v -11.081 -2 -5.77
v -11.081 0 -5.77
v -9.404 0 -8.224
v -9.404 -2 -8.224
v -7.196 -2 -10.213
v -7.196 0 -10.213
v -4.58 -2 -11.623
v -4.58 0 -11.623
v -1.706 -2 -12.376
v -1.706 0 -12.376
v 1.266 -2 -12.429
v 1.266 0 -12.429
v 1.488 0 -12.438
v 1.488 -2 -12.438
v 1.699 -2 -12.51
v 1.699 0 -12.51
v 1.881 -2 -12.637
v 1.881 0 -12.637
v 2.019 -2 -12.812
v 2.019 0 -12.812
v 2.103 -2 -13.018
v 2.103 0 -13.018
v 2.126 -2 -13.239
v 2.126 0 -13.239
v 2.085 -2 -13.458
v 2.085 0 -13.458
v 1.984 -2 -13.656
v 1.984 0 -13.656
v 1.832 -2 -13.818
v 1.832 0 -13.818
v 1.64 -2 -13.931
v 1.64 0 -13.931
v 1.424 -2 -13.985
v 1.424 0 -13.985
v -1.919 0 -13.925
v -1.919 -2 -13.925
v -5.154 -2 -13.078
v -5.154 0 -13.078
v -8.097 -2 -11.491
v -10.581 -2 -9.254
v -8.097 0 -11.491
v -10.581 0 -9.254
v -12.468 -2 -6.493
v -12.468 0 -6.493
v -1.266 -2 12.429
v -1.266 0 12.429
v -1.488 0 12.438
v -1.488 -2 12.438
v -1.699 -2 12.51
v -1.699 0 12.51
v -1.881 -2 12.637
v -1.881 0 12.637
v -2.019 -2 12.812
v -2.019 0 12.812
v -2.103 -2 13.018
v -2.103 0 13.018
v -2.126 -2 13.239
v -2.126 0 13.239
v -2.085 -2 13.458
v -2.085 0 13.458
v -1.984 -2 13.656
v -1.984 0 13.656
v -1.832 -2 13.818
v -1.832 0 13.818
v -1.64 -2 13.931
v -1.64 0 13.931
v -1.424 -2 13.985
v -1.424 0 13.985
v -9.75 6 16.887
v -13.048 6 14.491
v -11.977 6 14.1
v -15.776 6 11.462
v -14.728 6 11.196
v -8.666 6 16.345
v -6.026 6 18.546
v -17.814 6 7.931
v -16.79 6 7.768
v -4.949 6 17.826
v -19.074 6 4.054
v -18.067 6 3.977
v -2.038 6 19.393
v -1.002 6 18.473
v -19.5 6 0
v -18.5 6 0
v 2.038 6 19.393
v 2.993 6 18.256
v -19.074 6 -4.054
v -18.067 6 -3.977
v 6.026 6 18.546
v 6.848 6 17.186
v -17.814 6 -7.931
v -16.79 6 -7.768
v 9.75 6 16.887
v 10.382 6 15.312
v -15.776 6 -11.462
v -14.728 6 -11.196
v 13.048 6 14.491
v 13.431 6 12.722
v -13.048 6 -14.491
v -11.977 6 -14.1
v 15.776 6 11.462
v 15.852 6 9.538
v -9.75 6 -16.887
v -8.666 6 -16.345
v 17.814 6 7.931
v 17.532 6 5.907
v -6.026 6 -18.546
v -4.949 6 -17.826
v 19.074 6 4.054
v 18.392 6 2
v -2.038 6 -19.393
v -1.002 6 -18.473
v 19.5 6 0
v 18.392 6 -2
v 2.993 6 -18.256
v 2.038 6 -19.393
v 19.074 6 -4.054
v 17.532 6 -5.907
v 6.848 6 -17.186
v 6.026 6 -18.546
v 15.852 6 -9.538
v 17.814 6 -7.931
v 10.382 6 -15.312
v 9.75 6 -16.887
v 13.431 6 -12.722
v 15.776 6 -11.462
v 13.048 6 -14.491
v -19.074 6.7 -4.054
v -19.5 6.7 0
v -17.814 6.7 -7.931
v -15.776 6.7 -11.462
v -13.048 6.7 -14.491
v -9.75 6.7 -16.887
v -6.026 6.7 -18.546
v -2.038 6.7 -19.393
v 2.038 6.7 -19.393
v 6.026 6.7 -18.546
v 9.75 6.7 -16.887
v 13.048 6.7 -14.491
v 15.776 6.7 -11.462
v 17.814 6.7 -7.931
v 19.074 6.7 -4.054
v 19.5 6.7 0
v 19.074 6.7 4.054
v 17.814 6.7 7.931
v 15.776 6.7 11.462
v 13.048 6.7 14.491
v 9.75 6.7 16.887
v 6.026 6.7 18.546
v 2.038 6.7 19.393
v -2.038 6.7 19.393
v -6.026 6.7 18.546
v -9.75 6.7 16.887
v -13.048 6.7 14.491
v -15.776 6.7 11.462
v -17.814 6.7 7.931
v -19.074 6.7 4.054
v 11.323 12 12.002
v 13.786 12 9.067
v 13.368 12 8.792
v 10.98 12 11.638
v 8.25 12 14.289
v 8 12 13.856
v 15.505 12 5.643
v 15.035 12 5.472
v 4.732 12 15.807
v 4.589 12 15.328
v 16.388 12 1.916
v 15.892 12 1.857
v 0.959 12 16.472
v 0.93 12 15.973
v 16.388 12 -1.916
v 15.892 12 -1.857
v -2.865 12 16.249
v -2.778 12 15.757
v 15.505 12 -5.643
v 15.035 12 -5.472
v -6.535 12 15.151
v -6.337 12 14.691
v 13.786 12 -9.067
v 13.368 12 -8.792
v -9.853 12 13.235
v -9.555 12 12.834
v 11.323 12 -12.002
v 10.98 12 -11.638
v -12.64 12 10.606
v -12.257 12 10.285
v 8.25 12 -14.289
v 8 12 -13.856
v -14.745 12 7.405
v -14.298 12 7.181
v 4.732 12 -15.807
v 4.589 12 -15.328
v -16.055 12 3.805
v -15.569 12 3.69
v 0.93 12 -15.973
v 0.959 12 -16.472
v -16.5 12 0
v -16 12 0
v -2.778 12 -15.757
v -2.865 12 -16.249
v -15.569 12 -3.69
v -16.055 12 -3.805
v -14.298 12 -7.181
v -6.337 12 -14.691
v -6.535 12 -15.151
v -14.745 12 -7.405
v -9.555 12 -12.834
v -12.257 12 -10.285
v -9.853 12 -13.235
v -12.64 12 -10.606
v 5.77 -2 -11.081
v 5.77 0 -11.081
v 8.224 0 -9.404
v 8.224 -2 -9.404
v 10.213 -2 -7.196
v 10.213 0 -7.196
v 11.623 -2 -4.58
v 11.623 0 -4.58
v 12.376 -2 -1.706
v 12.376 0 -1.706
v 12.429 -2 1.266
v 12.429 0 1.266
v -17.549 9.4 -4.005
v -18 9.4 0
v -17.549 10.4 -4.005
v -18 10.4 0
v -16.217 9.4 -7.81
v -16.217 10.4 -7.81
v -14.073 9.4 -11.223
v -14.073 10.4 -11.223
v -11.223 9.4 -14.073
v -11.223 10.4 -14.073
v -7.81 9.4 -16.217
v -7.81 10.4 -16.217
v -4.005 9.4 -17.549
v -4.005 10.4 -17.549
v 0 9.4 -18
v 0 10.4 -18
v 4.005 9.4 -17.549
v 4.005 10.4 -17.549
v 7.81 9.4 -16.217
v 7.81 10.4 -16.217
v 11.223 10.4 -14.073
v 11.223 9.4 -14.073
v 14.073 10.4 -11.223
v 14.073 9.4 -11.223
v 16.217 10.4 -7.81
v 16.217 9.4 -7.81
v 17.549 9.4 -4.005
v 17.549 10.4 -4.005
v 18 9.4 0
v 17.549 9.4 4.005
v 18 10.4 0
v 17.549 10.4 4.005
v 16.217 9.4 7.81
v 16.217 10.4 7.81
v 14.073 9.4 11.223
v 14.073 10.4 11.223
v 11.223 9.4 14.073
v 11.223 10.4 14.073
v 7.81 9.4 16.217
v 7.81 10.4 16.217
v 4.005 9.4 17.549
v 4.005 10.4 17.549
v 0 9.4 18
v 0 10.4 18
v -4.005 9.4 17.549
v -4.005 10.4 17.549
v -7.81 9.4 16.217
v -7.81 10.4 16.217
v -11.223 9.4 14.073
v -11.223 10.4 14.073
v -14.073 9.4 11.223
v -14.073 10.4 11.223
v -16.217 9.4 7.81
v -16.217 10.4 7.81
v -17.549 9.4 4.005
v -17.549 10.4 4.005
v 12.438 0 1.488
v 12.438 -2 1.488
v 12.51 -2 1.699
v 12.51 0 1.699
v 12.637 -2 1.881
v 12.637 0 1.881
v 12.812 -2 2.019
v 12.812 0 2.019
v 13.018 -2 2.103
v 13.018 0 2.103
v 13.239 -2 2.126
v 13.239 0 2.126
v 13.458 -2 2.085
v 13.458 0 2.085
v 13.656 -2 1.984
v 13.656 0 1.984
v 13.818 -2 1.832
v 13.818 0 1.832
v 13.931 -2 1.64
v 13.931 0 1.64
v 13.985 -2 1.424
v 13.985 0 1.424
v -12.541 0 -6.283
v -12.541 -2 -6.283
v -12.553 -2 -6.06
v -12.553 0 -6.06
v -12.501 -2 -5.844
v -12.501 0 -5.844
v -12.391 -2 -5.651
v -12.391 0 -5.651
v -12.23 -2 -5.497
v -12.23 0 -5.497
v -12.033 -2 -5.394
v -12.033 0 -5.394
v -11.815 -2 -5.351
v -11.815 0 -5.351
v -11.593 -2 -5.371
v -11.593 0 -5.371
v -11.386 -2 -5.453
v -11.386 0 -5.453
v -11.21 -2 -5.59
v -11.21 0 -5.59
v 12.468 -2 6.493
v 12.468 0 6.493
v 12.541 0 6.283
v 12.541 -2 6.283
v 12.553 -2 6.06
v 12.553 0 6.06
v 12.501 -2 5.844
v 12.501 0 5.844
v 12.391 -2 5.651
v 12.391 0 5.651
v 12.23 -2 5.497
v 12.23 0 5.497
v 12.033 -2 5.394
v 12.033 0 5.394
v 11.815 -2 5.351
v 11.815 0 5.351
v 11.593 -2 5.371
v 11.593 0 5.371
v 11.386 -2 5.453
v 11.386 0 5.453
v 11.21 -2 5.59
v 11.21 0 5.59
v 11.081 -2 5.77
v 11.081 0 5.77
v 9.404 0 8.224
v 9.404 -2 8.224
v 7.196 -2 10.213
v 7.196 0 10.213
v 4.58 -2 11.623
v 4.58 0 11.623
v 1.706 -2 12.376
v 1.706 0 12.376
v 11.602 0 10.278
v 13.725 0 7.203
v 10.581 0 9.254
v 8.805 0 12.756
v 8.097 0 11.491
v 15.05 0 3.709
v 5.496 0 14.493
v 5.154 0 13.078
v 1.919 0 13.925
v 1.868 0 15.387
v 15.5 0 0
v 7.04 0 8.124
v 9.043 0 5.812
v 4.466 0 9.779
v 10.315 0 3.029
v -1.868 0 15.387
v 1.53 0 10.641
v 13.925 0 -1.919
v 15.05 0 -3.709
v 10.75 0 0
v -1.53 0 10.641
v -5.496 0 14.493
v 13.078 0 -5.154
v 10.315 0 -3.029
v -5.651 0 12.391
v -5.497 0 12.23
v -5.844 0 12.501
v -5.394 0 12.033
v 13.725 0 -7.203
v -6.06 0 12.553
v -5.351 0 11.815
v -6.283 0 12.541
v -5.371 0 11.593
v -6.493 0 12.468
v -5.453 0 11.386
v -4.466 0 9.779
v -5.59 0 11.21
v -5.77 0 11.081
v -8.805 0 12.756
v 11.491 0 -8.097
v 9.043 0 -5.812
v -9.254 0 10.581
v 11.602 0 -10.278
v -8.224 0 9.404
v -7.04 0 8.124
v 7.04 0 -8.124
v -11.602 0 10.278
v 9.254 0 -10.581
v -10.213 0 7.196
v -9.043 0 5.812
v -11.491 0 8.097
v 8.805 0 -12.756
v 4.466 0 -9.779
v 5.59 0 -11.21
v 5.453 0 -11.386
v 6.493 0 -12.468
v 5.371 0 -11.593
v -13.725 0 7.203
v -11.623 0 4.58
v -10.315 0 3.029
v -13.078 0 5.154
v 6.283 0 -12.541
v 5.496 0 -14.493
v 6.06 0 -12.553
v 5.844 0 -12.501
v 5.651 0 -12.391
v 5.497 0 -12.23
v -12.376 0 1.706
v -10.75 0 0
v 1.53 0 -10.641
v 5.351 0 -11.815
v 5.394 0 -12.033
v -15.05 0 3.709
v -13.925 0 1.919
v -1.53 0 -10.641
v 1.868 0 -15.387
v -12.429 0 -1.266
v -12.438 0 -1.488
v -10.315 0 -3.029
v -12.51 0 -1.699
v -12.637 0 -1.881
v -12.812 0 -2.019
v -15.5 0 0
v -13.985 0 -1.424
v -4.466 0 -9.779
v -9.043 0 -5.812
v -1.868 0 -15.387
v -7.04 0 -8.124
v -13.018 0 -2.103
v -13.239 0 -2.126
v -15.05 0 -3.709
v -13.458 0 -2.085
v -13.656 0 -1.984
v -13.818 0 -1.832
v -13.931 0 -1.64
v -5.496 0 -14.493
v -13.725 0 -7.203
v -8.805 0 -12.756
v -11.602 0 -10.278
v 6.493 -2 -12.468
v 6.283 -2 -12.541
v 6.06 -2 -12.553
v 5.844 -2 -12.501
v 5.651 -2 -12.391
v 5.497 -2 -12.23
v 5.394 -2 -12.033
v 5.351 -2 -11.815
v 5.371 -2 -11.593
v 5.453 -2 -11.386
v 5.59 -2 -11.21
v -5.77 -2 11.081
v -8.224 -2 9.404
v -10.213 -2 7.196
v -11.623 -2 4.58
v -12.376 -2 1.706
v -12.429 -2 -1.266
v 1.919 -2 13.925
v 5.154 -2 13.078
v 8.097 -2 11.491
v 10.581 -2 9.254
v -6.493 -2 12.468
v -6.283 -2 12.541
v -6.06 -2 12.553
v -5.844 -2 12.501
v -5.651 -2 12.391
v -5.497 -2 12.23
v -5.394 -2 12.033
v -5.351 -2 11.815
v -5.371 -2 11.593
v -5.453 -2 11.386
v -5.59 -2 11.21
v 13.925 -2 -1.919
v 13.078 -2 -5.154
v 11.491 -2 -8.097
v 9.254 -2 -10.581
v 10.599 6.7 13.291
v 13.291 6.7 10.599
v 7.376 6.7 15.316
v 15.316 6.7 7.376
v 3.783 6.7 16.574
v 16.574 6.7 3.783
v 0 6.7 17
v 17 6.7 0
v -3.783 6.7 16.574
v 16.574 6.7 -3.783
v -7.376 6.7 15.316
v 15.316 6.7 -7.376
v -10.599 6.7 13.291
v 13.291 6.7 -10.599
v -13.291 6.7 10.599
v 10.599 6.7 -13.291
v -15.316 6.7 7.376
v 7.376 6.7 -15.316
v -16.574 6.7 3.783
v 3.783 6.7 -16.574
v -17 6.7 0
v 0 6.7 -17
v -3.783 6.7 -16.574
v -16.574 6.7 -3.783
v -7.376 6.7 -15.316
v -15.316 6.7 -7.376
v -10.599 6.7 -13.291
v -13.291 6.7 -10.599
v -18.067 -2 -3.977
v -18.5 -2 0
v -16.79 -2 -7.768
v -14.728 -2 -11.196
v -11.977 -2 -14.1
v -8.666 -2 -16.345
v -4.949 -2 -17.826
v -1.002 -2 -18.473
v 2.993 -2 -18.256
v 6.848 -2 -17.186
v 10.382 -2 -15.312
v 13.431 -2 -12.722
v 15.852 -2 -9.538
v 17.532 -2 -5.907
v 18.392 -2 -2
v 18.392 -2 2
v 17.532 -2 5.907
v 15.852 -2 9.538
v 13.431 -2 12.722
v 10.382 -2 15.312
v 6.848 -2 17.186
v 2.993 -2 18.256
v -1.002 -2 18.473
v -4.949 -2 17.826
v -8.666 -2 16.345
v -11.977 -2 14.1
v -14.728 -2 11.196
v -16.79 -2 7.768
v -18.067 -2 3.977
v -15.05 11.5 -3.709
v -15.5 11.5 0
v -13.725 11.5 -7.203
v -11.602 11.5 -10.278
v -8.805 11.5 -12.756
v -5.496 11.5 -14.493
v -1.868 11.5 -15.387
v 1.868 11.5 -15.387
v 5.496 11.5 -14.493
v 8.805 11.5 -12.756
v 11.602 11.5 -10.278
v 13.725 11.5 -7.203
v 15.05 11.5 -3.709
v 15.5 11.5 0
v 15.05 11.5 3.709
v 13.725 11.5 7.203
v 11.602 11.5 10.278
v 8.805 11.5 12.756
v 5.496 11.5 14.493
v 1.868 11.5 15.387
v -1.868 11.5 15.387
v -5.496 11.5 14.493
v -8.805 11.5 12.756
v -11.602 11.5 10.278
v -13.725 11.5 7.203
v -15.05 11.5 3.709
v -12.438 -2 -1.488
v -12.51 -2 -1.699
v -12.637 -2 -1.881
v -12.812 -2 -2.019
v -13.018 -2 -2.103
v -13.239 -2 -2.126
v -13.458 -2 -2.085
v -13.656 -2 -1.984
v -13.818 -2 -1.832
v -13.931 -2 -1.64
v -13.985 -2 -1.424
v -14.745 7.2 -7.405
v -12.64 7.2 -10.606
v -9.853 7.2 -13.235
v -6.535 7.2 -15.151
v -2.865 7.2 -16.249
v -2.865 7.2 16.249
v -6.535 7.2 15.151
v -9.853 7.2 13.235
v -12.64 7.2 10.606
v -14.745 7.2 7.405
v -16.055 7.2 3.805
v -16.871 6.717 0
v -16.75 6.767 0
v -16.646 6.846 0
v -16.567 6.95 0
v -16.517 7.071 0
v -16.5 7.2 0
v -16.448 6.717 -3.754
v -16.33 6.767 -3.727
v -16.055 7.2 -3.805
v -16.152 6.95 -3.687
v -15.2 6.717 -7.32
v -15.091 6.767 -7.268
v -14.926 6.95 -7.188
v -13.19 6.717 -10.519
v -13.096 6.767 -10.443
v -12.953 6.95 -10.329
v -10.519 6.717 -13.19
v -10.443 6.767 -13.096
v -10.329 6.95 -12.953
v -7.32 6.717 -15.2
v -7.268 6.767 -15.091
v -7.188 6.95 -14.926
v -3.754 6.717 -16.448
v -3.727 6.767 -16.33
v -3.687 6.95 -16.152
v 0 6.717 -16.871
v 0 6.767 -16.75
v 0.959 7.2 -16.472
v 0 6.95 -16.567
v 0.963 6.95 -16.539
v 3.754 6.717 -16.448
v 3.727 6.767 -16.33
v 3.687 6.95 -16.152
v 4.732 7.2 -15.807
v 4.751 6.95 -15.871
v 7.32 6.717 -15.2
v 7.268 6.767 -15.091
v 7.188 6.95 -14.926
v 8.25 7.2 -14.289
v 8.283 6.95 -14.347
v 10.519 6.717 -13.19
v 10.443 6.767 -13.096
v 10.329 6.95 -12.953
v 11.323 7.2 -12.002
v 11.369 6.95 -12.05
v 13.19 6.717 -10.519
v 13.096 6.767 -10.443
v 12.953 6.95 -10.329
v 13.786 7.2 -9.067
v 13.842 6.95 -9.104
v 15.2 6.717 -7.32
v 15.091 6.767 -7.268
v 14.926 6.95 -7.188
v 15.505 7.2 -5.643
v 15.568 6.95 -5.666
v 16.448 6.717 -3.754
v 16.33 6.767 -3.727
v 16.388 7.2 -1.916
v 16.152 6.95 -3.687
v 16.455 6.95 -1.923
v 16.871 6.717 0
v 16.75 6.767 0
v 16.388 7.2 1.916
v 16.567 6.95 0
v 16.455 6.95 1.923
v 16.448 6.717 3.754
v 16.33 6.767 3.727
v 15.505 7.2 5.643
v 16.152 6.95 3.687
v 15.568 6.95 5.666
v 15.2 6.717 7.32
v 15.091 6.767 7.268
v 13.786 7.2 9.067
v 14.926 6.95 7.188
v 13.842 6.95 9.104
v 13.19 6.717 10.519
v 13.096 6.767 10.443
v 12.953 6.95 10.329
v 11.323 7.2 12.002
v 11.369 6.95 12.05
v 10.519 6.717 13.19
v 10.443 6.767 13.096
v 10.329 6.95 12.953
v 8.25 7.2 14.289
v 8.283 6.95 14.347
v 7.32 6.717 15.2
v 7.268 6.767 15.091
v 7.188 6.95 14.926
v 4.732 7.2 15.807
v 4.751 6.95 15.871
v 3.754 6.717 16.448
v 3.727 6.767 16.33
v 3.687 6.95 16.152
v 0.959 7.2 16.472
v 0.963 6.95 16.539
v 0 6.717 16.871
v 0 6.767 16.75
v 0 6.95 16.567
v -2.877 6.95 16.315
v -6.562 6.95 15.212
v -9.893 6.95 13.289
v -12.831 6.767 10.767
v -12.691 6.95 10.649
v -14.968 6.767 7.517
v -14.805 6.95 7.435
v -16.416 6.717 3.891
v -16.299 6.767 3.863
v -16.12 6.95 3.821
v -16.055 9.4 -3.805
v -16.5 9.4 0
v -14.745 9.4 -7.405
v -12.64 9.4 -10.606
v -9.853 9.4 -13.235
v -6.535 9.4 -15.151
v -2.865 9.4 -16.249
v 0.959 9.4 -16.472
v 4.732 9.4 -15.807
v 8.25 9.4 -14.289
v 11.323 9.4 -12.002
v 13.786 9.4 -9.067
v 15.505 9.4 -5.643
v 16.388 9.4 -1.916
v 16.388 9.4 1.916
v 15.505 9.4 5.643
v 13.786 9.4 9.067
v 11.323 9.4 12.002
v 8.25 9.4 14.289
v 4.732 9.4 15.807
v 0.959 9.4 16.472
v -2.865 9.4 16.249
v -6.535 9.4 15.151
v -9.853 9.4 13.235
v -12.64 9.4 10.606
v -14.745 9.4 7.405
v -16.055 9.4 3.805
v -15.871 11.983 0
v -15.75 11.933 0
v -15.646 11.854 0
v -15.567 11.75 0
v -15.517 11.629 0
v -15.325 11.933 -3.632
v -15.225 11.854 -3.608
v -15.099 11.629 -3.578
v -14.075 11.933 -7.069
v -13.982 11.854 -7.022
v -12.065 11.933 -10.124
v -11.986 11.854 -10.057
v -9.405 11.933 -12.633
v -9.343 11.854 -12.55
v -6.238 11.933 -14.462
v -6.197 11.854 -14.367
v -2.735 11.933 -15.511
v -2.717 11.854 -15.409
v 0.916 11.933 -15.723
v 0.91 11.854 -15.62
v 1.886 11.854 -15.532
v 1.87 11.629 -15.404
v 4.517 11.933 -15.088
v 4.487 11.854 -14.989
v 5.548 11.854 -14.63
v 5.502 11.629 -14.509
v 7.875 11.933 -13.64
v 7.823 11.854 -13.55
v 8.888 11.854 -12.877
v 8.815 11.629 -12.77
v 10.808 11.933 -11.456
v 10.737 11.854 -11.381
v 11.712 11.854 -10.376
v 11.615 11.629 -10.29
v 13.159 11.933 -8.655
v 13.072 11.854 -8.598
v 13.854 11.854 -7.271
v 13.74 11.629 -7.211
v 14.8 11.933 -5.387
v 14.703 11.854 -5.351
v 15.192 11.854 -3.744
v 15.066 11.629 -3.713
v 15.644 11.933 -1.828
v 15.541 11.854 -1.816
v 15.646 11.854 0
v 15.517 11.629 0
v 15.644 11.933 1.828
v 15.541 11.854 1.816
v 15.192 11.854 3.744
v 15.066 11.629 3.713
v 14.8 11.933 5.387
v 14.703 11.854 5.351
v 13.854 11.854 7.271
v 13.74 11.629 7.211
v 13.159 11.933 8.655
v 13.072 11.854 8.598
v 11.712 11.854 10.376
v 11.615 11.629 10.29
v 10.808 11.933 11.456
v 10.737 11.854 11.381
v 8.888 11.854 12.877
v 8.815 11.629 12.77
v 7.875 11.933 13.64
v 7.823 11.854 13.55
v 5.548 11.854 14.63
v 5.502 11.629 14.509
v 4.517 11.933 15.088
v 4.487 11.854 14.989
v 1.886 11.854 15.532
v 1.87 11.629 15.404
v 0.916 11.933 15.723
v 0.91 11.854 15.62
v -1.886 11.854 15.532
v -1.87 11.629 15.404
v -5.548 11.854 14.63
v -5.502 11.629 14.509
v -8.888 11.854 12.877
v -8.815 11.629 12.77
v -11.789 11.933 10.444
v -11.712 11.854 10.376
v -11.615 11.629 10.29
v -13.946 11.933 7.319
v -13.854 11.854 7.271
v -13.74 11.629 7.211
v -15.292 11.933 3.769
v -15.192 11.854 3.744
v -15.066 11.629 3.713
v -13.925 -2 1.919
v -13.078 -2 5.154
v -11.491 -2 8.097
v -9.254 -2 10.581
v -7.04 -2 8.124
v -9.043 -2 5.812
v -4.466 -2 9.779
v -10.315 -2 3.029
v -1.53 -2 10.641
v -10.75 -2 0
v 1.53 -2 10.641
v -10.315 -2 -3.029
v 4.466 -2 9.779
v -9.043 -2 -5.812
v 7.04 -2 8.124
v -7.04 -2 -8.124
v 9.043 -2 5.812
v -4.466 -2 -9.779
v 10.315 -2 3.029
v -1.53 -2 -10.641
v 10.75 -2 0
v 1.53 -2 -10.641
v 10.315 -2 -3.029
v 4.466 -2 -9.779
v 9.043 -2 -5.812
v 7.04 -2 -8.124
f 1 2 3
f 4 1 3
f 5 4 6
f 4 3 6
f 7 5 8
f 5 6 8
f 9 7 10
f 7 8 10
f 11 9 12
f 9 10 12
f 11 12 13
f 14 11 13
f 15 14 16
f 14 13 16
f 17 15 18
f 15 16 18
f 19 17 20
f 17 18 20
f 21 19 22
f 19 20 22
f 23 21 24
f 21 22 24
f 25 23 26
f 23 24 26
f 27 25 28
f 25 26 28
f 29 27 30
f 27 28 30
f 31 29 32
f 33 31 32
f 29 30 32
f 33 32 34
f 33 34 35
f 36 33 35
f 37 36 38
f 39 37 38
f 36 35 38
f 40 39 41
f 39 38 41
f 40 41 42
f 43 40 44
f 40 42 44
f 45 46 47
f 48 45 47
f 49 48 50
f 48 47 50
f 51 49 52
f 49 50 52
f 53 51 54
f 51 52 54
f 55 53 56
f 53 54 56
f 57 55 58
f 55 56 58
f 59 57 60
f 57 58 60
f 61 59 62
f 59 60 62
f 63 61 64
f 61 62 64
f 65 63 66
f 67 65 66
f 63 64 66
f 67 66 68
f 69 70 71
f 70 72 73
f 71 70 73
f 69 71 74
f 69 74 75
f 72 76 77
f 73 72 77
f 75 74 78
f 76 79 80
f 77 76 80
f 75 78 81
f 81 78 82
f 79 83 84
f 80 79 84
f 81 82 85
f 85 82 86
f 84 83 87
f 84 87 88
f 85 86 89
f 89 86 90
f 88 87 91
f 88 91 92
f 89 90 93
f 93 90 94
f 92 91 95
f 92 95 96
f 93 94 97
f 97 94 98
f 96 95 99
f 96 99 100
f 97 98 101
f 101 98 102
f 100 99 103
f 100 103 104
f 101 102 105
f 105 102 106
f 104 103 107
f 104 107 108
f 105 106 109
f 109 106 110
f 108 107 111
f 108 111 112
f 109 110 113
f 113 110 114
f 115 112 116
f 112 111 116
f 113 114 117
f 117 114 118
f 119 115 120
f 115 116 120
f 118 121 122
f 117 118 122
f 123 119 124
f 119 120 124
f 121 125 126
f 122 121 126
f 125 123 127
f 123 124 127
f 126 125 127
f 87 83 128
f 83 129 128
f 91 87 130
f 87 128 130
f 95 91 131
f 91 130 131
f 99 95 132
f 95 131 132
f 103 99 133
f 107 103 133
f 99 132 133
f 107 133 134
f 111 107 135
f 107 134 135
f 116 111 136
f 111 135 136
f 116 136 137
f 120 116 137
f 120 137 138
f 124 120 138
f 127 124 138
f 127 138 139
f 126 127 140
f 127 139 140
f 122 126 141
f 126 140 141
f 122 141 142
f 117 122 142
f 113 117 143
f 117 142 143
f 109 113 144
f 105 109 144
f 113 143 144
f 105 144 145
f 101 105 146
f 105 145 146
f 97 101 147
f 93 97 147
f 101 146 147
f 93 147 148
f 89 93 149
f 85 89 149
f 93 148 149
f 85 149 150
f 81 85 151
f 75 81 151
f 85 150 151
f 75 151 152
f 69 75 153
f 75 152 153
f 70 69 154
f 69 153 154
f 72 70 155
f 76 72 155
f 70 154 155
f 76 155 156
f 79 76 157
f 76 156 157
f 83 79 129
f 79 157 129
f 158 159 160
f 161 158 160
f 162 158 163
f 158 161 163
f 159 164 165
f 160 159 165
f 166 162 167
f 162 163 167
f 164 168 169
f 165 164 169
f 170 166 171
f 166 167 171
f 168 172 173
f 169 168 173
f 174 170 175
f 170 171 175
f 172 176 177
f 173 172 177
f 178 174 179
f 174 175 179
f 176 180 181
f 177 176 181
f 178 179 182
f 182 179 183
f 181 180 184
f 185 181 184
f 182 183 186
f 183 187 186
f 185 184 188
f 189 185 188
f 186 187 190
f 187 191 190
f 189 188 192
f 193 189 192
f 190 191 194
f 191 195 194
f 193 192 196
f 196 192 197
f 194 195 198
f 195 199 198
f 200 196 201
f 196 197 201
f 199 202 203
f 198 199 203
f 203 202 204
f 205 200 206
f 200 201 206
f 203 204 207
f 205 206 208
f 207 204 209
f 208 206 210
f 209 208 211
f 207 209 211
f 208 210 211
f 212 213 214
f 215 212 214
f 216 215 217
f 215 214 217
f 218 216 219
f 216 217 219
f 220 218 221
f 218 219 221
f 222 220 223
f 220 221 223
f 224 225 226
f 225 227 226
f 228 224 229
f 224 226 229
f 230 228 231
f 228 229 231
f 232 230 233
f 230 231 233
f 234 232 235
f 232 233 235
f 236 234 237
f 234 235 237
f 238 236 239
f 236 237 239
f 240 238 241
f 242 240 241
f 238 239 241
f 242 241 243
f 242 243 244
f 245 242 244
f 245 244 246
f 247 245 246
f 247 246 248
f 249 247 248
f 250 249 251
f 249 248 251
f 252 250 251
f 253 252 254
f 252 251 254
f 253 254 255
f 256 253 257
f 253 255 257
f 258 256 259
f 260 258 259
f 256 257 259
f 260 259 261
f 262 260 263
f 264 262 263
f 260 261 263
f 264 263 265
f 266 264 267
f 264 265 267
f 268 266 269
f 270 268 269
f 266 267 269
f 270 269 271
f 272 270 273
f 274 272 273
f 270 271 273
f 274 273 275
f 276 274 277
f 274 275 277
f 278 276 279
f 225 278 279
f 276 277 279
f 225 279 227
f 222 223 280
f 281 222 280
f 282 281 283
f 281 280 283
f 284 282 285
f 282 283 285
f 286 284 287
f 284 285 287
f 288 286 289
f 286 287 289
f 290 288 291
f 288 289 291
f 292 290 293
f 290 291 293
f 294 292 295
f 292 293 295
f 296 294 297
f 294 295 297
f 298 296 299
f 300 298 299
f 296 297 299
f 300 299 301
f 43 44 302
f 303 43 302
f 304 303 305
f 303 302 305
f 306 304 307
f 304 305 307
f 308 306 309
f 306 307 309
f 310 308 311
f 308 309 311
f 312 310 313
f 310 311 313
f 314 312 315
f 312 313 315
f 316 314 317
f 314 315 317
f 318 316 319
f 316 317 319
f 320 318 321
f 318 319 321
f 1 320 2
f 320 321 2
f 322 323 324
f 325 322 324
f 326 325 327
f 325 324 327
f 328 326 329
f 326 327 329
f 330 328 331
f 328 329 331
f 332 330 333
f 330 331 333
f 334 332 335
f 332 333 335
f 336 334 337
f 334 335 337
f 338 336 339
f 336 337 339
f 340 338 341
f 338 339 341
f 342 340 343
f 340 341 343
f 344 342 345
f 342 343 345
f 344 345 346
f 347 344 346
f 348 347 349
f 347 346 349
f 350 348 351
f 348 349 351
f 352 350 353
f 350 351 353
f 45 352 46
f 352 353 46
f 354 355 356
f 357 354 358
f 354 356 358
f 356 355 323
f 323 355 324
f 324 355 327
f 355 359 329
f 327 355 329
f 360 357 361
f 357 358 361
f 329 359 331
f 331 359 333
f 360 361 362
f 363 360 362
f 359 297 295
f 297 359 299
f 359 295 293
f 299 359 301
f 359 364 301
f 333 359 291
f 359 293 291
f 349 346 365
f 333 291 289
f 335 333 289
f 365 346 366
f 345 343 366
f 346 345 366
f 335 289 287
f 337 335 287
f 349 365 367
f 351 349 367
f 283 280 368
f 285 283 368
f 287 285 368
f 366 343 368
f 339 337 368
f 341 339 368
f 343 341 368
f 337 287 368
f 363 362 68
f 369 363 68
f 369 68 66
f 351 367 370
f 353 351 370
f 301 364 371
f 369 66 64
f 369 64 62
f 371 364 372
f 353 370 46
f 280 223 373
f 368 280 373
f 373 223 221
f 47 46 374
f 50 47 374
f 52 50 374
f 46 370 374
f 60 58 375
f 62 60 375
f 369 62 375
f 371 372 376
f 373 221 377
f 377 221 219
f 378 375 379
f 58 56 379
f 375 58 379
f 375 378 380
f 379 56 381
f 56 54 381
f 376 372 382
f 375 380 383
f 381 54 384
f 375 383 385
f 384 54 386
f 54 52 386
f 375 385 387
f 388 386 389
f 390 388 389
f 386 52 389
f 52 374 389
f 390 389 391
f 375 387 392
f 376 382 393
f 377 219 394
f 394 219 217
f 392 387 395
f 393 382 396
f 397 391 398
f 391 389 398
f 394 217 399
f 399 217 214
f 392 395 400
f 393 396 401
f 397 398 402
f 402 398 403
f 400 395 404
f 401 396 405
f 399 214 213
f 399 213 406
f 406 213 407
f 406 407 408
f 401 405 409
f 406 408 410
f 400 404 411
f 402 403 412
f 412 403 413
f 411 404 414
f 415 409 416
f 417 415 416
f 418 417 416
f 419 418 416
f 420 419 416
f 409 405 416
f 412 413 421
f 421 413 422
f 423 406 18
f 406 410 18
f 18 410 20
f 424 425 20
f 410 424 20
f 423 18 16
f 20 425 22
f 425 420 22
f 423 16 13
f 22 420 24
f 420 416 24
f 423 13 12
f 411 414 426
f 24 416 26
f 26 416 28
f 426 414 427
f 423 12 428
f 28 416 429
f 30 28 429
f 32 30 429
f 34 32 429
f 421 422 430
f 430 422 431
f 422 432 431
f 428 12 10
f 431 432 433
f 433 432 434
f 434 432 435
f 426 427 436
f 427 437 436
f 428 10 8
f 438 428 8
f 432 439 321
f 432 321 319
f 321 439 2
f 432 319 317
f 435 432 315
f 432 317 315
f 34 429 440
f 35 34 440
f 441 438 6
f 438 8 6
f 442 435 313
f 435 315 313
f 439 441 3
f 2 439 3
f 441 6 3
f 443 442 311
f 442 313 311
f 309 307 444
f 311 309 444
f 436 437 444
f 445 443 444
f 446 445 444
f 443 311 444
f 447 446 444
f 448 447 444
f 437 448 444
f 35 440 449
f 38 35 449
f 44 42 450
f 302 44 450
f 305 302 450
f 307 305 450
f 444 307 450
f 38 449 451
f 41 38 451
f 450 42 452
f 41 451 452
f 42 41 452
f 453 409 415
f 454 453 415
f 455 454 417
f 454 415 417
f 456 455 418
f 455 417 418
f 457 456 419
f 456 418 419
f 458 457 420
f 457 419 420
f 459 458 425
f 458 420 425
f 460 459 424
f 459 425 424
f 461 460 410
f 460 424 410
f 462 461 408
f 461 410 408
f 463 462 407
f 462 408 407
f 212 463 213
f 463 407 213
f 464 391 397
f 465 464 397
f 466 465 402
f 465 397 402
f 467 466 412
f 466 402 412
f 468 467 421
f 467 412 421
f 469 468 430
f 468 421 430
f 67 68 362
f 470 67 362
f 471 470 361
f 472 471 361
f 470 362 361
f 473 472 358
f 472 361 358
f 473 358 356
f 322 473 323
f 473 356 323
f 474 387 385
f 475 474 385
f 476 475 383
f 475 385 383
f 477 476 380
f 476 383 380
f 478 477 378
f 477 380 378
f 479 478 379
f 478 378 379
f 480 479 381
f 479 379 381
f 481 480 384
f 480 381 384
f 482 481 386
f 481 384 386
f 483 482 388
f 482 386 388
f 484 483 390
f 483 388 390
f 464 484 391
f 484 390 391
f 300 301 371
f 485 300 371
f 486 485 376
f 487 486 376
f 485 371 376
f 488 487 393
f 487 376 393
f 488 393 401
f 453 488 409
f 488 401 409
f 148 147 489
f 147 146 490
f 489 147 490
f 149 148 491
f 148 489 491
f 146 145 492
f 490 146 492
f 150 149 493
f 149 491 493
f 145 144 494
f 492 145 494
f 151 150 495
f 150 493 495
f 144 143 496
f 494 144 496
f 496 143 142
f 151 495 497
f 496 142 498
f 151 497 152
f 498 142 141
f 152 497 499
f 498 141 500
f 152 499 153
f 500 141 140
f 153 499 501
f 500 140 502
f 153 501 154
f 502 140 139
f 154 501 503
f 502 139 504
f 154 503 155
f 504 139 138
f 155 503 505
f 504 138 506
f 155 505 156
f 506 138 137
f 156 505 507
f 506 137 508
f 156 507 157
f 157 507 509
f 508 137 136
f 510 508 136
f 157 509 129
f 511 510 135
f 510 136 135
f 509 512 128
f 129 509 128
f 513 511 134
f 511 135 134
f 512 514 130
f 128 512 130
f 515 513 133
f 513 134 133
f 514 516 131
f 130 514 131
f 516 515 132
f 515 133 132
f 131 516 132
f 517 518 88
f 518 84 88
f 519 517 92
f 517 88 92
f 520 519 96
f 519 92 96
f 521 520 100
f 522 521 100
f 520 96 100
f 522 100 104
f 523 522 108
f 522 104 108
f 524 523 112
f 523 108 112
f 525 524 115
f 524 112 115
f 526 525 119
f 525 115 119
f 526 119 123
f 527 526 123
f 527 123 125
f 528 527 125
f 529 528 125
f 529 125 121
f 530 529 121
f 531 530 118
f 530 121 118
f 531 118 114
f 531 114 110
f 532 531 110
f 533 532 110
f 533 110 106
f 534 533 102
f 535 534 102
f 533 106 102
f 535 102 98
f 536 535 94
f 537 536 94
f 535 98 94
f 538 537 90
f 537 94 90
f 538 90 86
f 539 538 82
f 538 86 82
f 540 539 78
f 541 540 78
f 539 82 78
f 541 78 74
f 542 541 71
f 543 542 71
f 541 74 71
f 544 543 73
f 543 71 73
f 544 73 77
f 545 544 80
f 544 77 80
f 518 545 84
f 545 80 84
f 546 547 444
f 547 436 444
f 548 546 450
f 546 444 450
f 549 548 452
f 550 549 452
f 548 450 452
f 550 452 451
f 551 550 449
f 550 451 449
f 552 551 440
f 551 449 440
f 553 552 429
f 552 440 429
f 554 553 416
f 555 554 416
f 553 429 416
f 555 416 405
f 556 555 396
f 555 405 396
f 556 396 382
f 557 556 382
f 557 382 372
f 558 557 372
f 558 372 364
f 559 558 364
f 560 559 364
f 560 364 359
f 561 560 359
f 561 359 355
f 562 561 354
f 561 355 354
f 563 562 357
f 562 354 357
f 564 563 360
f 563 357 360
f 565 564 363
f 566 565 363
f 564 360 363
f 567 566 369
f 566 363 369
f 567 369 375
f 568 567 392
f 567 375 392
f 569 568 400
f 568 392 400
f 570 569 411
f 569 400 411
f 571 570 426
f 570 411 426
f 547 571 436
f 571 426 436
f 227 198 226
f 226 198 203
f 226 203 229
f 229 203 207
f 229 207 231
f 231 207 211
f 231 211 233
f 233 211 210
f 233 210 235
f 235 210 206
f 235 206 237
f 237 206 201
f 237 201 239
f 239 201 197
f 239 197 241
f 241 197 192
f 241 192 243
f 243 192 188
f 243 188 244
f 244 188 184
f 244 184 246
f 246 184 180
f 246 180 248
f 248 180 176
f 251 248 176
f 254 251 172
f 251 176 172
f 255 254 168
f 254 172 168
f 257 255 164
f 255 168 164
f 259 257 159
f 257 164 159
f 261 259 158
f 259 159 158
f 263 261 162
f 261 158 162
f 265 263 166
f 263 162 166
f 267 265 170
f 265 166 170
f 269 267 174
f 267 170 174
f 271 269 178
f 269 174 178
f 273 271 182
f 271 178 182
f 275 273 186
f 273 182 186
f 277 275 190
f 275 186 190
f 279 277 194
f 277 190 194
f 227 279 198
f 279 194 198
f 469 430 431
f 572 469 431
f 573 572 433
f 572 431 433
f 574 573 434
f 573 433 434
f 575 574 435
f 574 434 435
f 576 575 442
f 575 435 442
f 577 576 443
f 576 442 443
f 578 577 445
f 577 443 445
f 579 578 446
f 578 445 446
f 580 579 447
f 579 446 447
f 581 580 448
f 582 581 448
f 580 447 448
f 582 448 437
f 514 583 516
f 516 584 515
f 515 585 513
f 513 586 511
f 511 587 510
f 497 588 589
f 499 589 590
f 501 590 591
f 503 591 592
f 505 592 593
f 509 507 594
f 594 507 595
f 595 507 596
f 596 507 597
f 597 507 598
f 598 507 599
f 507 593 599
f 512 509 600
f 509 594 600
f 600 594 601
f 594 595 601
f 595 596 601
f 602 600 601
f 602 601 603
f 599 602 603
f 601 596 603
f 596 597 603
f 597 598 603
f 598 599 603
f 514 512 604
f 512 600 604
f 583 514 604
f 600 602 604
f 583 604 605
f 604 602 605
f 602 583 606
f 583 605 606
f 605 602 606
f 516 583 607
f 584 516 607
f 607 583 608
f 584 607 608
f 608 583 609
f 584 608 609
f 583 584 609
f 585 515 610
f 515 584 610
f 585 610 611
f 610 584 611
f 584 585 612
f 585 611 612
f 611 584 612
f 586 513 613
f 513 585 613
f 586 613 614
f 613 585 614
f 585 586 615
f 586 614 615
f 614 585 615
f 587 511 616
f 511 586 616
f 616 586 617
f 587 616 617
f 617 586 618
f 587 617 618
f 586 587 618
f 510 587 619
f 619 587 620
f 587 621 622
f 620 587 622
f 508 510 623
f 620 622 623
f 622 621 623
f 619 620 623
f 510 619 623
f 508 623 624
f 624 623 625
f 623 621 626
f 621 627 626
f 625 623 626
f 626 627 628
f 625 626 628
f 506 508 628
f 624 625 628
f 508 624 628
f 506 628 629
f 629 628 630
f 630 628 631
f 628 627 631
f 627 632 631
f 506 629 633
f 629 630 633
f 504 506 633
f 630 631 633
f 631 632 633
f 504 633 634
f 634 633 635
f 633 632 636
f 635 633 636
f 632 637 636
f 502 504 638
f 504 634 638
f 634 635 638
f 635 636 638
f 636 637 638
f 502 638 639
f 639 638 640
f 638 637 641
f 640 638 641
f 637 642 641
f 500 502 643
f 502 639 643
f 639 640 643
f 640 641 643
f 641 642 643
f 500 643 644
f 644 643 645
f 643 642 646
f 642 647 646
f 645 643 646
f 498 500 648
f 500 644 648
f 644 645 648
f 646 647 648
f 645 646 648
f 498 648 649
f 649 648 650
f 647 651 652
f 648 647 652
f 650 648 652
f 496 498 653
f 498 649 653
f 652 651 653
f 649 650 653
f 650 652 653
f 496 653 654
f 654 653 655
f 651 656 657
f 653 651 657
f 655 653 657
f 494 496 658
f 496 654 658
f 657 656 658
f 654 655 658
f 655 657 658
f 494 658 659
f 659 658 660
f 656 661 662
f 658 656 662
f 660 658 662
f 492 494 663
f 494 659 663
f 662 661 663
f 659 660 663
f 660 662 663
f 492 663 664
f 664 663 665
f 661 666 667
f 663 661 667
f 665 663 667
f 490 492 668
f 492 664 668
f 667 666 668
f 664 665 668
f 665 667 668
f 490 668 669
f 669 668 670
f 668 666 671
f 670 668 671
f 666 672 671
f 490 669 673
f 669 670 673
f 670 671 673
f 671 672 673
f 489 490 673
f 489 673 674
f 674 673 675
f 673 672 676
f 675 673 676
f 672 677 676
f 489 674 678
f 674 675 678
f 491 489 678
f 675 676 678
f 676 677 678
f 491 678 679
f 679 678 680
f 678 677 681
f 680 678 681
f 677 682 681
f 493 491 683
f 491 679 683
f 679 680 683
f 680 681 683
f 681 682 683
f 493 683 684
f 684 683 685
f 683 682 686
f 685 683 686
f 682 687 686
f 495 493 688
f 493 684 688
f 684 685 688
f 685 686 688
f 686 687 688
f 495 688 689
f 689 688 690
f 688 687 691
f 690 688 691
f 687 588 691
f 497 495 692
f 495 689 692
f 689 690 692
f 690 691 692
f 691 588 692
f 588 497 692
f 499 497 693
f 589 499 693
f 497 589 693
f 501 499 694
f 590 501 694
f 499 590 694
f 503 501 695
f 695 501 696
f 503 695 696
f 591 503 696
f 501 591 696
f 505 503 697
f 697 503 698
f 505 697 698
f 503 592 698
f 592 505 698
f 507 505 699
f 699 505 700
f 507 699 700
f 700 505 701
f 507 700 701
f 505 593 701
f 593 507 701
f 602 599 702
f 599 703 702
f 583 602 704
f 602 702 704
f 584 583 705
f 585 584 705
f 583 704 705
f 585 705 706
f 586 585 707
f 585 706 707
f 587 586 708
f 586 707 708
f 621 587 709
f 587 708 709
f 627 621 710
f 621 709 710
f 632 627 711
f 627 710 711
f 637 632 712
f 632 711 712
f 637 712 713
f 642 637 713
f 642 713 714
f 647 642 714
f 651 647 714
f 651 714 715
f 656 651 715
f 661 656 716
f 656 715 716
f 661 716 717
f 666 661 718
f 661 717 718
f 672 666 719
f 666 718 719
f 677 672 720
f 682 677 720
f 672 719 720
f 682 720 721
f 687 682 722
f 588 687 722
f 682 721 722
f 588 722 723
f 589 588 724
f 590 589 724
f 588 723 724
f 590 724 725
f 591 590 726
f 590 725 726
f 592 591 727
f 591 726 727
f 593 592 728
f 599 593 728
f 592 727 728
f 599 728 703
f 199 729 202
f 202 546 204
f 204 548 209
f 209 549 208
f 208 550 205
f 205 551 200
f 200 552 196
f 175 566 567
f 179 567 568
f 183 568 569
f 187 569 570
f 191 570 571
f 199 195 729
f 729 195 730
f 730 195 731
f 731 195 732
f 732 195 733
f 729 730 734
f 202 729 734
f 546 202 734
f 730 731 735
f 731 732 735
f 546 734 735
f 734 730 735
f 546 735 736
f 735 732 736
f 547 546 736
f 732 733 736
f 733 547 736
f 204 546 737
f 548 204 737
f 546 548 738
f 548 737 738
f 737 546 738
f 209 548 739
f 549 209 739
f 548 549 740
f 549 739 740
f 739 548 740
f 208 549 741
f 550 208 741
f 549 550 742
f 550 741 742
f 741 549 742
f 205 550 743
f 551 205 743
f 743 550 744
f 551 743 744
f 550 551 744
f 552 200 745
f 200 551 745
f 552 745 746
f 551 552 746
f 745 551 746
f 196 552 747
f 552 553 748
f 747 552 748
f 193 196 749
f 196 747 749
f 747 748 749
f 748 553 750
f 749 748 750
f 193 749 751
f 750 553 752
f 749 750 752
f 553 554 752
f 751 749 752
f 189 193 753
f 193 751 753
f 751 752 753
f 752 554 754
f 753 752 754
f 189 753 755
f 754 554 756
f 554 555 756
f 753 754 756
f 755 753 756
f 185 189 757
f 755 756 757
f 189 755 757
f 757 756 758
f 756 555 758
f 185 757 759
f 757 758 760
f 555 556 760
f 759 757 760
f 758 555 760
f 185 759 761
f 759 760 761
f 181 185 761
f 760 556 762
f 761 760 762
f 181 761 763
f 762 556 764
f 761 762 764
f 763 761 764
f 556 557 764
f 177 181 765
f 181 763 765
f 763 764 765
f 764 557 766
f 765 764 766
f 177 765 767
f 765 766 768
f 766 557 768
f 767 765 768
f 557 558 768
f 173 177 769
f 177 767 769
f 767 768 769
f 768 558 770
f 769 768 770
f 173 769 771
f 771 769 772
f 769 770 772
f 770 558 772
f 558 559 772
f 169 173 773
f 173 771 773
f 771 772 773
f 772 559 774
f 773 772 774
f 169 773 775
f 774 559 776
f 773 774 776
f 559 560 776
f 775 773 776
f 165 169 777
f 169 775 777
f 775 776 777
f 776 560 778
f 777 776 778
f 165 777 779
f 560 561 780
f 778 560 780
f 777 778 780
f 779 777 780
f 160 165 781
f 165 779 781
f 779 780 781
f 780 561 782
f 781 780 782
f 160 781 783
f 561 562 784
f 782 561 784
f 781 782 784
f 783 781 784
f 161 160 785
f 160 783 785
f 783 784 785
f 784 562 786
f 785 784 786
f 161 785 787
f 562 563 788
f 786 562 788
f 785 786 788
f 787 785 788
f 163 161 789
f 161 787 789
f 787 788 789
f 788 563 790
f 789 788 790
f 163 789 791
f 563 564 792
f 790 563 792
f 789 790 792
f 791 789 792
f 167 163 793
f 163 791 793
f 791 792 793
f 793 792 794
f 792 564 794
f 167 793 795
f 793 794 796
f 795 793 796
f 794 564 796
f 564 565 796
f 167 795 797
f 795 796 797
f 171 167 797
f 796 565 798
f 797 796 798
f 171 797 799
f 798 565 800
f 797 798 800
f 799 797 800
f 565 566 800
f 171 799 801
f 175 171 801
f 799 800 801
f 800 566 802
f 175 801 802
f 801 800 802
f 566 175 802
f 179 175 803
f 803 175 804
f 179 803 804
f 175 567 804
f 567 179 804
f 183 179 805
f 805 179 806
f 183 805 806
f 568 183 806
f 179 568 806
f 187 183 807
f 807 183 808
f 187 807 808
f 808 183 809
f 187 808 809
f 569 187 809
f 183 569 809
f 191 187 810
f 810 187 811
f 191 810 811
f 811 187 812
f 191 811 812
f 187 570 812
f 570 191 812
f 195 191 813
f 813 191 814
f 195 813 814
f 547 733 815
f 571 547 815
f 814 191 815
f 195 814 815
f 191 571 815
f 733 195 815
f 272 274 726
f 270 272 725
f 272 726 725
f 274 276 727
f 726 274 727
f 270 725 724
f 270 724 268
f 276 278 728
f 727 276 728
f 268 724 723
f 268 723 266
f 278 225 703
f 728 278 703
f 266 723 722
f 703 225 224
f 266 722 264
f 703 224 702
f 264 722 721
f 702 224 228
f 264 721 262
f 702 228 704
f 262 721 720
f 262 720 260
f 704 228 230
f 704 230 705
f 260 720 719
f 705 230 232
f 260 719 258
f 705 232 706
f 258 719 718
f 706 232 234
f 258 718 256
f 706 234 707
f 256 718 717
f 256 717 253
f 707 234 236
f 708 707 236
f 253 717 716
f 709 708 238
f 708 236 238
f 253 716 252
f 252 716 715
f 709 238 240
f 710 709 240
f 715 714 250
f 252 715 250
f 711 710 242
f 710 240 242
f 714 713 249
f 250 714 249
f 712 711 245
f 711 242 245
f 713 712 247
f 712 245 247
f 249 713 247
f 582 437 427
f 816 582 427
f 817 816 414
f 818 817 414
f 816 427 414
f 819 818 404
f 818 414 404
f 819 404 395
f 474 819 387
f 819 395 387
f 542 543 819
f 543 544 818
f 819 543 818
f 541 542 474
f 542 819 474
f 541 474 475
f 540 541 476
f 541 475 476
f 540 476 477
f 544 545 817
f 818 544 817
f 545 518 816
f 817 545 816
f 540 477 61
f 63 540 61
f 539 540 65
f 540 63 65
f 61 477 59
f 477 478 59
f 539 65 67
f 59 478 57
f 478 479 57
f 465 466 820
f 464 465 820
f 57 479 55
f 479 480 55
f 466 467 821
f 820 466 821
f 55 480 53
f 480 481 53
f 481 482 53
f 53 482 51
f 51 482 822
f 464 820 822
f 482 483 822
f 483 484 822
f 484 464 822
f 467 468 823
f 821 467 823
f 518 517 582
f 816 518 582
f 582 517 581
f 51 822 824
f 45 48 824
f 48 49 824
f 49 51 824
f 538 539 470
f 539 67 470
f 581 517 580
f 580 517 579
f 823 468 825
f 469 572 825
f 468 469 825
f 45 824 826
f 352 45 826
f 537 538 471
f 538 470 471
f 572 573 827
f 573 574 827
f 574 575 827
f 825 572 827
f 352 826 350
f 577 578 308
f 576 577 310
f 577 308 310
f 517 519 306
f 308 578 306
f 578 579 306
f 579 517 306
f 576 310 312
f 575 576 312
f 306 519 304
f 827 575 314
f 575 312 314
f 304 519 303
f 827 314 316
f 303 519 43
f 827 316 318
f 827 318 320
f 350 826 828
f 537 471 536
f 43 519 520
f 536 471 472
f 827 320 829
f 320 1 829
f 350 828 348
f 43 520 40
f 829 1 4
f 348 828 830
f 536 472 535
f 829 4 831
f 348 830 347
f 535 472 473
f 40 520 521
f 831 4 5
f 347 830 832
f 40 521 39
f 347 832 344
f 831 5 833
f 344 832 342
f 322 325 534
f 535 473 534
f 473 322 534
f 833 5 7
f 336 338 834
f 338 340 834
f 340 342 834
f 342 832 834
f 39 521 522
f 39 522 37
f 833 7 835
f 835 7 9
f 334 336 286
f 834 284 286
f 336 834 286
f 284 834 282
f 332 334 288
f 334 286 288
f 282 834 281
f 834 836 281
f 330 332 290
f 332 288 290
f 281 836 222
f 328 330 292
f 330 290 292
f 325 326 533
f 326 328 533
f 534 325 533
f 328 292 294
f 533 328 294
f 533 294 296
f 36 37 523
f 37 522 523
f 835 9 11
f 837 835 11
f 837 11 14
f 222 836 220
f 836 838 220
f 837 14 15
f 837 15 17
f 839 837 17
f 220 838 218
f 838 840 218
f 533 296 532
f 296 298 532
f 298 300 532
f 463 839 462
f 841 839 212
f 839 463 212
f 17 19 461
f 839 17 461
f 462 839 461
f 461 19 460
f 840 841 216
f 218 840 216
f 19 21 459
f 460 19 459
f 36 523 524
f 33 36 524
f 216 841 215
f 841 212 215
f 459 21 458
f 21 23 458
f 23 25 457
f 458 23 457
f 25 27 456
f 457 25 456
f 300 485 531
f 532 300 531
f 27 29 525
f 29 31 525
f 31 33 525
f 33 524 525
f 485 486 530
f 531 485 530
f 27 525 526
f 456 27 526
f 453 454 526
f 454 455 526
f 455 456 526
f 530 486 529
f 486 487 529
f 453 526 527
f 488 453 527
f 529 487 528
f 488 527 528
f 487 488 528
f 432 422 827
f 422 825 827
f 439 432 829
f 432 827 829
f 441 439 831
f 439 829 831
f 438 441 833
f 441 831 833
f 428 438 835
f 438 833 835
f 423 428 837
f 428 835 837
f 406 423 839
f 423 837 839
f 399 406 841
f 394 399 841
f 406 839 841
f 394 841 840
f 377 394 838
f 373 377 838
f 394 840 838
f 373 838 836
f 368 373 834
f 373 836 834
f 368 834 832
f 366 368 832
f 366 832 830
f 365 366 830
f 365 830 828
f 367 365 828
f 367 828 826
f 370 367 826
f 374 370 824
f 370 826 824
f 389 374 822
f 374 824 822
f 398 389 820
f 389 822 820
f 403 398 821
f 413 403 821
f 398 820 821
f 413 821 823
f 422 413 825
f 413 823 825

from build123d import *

# Parameters (mm, degrees)
CUT_EXTRUDE1_REACH = 4


with BuildPart() as part:
    # Sketch1 → Revolve1 (revolve)
    with BuildSketch(Plane.XY):
        with BuildLine():
            Line((-16.5, 9.4), (-18, 9.4))
            Line((-18, 9.4), (-18, 10.4))
            Line((-18, 10.4), (-16.5, 12))
            Line((-16.5, 12), (-16, 12))
            ThreePointArc((-16, 12), (-15.646446609, 11.853553391), (-15.5, 11.5))
            Line((-15.5, 11.5), (-15.5, 0))
            Line((-15.5, 0), (-10.75, 0))
            Line((-10.75, 0), (-10.75, -2))
            Line((-10.75, -2), (-18.5, -2))
            Line((-18.5, -2), (-18.5, 0))
            Line((-18.5, 0), (-18.5, 6))
            Line((-18.5, 6), (-19.5, 6))
            Line((-19.5, 6), (-19.5, 6.7))
            Line((-19.5, 6.7), (-17, 6.7))
            ThreePointArc((-17, 6.7), (-16.646446609, 6.846446609), (-16.5, 7.2))
            Line((-16.5, 7.2), (-16.5, 9.4))
        make_face()
    revolve(axis=Axis((0, 12.7, 0), (0, -1, 0)))

    # Sketch2 → Cut-Extrude1 (cut, up to next)
    with BuildSketch(Plane(origin=(0, 0, 0), x_dir=(1, 0, 0), z_dir=(0, 1, 0)), mode=Mode.PRIVATE) as cut_extrude1_sk1:
        with BuildLine():
            ThreePointArc((-13.984583698, 1.42392711), (-12.372295403, -6.672514973), (-6.49274382, -12.467575037))
            ThreePointArc((-6.49274382, -12.467575037), (-5.438109449, -12.135235565), (-5.770448921, -11.080601194))
            ThreePointArc((-5.770448921, -11.080601194), (-10.995921084, -5.930221166), (-12.42884798, 1.265520231))
            ThreePointArc((-12.42884798, 1.265520231), (-13.127512399, 2.12259153), (-13.984583698, 1.42392711))
        make_face()
    cut_extrude1_tool1 = extrude(cut_extrude1_sk1.sketch, amount=-CUT_EXTRUDE1_REACH, mode=Mode.PRIVATE) & part.part
    add(cut_extrude1_tool1.solids().sort_by_distance((-5.589512, 0, 12.05639))[0], mode=Mode.SUBTRACT)
    # Sketch2 → Cut-Extrude1 (cut, up to next)
    with BuildSketch(Plane(origin=(0, 0, 0), x_dir=(1, 0, 0), z_dir=(0, 1, 0)), mode=Mode.PRIVATE) as cut_extrude1_sk2:
        with BuildLine():
            ThreePointArc((1.42392711, 13.984583698), (-6.672514973, 12.372295403), (-12.467575037, 6.49274382))
            ThreePointArc((-12.467575037, 6.49274382), (-12.135235565, 5.438109449), (-11.080601194, 5.770448921))
            ThreePointArc((-11.080601194, 5.770448921), (-5.930221166, 10.995921084), (1.265520231, 12.42884798))
            ThreePointArc((1.265520231, 12.42884798), (2.12259153, 13.127512399), (1.42392711, 13.984583698))
        make_face()
    cut_extrude1_tool2 = extrude(cut_extrude1_sk2.sketch, amount=-CUT_EXTRUDE1_REACH, mode=Mode.PRIVATE) & part.part
    add(cut_extrude1_tool2.solids().sort_by_distance((-6.01125, 0, -11.146166))[0], mode=Mode.SUBTRACT)
    # Sketch2 → Cut-Extrude1 (cut, up to next)
    with BuildSketch(Plane(origin=(0, 0, 0), x_dir=(1, 0, 0), z_dir=(0, 1, 0)), mode=Mode.PRIVATE) as cut_extrude1_sk3:
        with BuildLine():
            ThreePointArc((13.984583698, -1.42392711), (12.372295403, 6.672514973), (6.49274382, 12.467575037))
            ThreePointArc((6.49274382, 12.467575037), (5.438109449, 12.135235565), (5.770448921, 11.080601194))
            ThreePointArc((5.770448921, 11.080601194), (10.995921084, 5.930221166), (12.42884798, -1.265520231))
            ThreePointArc((12.42884798, -1.265520231), (13.127512399, -2.12259153), (13.984583698, -1.42392711))
        make_face()
    cut_extrude1_tool3 = extrude(cut_extrude1_sk3.sketch, amount=-CUT_EXTRUDE1_REACH, mode=Mode.PRIVATE) & part.part
    add(cut_extrude1_tool3.solids().sort_by_distance((13.144804, 0, 1.952767))[0], mode=Mode.SUBTRACT)
    # Sketch2 → Cut-Extrude1 (cut, up to next)
    with BuildSketch(Plane(origin=(0, 0, 0), x_dir=(1, 0, 0), z_dir=(0, 1, 0)), mode=Mode.PRIVATE) as cut_extrude1_sk4:
        with BuildLine():
            ThreePointArc((-1.42392711, -13.984583698), (6.672514973, -12.372295403), (12.467575037, -6.49274382))
            ThreePointArc((12.467575037, -6.49274382), (12.135235565, -5.438109449), (11.080601194, -5.770448921))
            ThreePointArc((11.080601194, -5.770448921), (5.930221166, -10.995921084), (-1.265520231, -12.42884798))
            ThreePointArc((-1.265520231, -12.42884798), (-2.12259153, -13.127512399), (-1.42392711, -13.984583698))
        make_face()
    cut_extrude1_tool4 = extrude(cut_extrude1_sk4.sketch, amount=-CUT_EXTRUDE1_REACH, mode=Mode.PRIVATE) & part.part
    add(cut_extrude1_tool4.solids().sort_by_distance((6.01125, 0, 11.146166))[0], mode=Mode.SUBTRACT)


solid = part.part
